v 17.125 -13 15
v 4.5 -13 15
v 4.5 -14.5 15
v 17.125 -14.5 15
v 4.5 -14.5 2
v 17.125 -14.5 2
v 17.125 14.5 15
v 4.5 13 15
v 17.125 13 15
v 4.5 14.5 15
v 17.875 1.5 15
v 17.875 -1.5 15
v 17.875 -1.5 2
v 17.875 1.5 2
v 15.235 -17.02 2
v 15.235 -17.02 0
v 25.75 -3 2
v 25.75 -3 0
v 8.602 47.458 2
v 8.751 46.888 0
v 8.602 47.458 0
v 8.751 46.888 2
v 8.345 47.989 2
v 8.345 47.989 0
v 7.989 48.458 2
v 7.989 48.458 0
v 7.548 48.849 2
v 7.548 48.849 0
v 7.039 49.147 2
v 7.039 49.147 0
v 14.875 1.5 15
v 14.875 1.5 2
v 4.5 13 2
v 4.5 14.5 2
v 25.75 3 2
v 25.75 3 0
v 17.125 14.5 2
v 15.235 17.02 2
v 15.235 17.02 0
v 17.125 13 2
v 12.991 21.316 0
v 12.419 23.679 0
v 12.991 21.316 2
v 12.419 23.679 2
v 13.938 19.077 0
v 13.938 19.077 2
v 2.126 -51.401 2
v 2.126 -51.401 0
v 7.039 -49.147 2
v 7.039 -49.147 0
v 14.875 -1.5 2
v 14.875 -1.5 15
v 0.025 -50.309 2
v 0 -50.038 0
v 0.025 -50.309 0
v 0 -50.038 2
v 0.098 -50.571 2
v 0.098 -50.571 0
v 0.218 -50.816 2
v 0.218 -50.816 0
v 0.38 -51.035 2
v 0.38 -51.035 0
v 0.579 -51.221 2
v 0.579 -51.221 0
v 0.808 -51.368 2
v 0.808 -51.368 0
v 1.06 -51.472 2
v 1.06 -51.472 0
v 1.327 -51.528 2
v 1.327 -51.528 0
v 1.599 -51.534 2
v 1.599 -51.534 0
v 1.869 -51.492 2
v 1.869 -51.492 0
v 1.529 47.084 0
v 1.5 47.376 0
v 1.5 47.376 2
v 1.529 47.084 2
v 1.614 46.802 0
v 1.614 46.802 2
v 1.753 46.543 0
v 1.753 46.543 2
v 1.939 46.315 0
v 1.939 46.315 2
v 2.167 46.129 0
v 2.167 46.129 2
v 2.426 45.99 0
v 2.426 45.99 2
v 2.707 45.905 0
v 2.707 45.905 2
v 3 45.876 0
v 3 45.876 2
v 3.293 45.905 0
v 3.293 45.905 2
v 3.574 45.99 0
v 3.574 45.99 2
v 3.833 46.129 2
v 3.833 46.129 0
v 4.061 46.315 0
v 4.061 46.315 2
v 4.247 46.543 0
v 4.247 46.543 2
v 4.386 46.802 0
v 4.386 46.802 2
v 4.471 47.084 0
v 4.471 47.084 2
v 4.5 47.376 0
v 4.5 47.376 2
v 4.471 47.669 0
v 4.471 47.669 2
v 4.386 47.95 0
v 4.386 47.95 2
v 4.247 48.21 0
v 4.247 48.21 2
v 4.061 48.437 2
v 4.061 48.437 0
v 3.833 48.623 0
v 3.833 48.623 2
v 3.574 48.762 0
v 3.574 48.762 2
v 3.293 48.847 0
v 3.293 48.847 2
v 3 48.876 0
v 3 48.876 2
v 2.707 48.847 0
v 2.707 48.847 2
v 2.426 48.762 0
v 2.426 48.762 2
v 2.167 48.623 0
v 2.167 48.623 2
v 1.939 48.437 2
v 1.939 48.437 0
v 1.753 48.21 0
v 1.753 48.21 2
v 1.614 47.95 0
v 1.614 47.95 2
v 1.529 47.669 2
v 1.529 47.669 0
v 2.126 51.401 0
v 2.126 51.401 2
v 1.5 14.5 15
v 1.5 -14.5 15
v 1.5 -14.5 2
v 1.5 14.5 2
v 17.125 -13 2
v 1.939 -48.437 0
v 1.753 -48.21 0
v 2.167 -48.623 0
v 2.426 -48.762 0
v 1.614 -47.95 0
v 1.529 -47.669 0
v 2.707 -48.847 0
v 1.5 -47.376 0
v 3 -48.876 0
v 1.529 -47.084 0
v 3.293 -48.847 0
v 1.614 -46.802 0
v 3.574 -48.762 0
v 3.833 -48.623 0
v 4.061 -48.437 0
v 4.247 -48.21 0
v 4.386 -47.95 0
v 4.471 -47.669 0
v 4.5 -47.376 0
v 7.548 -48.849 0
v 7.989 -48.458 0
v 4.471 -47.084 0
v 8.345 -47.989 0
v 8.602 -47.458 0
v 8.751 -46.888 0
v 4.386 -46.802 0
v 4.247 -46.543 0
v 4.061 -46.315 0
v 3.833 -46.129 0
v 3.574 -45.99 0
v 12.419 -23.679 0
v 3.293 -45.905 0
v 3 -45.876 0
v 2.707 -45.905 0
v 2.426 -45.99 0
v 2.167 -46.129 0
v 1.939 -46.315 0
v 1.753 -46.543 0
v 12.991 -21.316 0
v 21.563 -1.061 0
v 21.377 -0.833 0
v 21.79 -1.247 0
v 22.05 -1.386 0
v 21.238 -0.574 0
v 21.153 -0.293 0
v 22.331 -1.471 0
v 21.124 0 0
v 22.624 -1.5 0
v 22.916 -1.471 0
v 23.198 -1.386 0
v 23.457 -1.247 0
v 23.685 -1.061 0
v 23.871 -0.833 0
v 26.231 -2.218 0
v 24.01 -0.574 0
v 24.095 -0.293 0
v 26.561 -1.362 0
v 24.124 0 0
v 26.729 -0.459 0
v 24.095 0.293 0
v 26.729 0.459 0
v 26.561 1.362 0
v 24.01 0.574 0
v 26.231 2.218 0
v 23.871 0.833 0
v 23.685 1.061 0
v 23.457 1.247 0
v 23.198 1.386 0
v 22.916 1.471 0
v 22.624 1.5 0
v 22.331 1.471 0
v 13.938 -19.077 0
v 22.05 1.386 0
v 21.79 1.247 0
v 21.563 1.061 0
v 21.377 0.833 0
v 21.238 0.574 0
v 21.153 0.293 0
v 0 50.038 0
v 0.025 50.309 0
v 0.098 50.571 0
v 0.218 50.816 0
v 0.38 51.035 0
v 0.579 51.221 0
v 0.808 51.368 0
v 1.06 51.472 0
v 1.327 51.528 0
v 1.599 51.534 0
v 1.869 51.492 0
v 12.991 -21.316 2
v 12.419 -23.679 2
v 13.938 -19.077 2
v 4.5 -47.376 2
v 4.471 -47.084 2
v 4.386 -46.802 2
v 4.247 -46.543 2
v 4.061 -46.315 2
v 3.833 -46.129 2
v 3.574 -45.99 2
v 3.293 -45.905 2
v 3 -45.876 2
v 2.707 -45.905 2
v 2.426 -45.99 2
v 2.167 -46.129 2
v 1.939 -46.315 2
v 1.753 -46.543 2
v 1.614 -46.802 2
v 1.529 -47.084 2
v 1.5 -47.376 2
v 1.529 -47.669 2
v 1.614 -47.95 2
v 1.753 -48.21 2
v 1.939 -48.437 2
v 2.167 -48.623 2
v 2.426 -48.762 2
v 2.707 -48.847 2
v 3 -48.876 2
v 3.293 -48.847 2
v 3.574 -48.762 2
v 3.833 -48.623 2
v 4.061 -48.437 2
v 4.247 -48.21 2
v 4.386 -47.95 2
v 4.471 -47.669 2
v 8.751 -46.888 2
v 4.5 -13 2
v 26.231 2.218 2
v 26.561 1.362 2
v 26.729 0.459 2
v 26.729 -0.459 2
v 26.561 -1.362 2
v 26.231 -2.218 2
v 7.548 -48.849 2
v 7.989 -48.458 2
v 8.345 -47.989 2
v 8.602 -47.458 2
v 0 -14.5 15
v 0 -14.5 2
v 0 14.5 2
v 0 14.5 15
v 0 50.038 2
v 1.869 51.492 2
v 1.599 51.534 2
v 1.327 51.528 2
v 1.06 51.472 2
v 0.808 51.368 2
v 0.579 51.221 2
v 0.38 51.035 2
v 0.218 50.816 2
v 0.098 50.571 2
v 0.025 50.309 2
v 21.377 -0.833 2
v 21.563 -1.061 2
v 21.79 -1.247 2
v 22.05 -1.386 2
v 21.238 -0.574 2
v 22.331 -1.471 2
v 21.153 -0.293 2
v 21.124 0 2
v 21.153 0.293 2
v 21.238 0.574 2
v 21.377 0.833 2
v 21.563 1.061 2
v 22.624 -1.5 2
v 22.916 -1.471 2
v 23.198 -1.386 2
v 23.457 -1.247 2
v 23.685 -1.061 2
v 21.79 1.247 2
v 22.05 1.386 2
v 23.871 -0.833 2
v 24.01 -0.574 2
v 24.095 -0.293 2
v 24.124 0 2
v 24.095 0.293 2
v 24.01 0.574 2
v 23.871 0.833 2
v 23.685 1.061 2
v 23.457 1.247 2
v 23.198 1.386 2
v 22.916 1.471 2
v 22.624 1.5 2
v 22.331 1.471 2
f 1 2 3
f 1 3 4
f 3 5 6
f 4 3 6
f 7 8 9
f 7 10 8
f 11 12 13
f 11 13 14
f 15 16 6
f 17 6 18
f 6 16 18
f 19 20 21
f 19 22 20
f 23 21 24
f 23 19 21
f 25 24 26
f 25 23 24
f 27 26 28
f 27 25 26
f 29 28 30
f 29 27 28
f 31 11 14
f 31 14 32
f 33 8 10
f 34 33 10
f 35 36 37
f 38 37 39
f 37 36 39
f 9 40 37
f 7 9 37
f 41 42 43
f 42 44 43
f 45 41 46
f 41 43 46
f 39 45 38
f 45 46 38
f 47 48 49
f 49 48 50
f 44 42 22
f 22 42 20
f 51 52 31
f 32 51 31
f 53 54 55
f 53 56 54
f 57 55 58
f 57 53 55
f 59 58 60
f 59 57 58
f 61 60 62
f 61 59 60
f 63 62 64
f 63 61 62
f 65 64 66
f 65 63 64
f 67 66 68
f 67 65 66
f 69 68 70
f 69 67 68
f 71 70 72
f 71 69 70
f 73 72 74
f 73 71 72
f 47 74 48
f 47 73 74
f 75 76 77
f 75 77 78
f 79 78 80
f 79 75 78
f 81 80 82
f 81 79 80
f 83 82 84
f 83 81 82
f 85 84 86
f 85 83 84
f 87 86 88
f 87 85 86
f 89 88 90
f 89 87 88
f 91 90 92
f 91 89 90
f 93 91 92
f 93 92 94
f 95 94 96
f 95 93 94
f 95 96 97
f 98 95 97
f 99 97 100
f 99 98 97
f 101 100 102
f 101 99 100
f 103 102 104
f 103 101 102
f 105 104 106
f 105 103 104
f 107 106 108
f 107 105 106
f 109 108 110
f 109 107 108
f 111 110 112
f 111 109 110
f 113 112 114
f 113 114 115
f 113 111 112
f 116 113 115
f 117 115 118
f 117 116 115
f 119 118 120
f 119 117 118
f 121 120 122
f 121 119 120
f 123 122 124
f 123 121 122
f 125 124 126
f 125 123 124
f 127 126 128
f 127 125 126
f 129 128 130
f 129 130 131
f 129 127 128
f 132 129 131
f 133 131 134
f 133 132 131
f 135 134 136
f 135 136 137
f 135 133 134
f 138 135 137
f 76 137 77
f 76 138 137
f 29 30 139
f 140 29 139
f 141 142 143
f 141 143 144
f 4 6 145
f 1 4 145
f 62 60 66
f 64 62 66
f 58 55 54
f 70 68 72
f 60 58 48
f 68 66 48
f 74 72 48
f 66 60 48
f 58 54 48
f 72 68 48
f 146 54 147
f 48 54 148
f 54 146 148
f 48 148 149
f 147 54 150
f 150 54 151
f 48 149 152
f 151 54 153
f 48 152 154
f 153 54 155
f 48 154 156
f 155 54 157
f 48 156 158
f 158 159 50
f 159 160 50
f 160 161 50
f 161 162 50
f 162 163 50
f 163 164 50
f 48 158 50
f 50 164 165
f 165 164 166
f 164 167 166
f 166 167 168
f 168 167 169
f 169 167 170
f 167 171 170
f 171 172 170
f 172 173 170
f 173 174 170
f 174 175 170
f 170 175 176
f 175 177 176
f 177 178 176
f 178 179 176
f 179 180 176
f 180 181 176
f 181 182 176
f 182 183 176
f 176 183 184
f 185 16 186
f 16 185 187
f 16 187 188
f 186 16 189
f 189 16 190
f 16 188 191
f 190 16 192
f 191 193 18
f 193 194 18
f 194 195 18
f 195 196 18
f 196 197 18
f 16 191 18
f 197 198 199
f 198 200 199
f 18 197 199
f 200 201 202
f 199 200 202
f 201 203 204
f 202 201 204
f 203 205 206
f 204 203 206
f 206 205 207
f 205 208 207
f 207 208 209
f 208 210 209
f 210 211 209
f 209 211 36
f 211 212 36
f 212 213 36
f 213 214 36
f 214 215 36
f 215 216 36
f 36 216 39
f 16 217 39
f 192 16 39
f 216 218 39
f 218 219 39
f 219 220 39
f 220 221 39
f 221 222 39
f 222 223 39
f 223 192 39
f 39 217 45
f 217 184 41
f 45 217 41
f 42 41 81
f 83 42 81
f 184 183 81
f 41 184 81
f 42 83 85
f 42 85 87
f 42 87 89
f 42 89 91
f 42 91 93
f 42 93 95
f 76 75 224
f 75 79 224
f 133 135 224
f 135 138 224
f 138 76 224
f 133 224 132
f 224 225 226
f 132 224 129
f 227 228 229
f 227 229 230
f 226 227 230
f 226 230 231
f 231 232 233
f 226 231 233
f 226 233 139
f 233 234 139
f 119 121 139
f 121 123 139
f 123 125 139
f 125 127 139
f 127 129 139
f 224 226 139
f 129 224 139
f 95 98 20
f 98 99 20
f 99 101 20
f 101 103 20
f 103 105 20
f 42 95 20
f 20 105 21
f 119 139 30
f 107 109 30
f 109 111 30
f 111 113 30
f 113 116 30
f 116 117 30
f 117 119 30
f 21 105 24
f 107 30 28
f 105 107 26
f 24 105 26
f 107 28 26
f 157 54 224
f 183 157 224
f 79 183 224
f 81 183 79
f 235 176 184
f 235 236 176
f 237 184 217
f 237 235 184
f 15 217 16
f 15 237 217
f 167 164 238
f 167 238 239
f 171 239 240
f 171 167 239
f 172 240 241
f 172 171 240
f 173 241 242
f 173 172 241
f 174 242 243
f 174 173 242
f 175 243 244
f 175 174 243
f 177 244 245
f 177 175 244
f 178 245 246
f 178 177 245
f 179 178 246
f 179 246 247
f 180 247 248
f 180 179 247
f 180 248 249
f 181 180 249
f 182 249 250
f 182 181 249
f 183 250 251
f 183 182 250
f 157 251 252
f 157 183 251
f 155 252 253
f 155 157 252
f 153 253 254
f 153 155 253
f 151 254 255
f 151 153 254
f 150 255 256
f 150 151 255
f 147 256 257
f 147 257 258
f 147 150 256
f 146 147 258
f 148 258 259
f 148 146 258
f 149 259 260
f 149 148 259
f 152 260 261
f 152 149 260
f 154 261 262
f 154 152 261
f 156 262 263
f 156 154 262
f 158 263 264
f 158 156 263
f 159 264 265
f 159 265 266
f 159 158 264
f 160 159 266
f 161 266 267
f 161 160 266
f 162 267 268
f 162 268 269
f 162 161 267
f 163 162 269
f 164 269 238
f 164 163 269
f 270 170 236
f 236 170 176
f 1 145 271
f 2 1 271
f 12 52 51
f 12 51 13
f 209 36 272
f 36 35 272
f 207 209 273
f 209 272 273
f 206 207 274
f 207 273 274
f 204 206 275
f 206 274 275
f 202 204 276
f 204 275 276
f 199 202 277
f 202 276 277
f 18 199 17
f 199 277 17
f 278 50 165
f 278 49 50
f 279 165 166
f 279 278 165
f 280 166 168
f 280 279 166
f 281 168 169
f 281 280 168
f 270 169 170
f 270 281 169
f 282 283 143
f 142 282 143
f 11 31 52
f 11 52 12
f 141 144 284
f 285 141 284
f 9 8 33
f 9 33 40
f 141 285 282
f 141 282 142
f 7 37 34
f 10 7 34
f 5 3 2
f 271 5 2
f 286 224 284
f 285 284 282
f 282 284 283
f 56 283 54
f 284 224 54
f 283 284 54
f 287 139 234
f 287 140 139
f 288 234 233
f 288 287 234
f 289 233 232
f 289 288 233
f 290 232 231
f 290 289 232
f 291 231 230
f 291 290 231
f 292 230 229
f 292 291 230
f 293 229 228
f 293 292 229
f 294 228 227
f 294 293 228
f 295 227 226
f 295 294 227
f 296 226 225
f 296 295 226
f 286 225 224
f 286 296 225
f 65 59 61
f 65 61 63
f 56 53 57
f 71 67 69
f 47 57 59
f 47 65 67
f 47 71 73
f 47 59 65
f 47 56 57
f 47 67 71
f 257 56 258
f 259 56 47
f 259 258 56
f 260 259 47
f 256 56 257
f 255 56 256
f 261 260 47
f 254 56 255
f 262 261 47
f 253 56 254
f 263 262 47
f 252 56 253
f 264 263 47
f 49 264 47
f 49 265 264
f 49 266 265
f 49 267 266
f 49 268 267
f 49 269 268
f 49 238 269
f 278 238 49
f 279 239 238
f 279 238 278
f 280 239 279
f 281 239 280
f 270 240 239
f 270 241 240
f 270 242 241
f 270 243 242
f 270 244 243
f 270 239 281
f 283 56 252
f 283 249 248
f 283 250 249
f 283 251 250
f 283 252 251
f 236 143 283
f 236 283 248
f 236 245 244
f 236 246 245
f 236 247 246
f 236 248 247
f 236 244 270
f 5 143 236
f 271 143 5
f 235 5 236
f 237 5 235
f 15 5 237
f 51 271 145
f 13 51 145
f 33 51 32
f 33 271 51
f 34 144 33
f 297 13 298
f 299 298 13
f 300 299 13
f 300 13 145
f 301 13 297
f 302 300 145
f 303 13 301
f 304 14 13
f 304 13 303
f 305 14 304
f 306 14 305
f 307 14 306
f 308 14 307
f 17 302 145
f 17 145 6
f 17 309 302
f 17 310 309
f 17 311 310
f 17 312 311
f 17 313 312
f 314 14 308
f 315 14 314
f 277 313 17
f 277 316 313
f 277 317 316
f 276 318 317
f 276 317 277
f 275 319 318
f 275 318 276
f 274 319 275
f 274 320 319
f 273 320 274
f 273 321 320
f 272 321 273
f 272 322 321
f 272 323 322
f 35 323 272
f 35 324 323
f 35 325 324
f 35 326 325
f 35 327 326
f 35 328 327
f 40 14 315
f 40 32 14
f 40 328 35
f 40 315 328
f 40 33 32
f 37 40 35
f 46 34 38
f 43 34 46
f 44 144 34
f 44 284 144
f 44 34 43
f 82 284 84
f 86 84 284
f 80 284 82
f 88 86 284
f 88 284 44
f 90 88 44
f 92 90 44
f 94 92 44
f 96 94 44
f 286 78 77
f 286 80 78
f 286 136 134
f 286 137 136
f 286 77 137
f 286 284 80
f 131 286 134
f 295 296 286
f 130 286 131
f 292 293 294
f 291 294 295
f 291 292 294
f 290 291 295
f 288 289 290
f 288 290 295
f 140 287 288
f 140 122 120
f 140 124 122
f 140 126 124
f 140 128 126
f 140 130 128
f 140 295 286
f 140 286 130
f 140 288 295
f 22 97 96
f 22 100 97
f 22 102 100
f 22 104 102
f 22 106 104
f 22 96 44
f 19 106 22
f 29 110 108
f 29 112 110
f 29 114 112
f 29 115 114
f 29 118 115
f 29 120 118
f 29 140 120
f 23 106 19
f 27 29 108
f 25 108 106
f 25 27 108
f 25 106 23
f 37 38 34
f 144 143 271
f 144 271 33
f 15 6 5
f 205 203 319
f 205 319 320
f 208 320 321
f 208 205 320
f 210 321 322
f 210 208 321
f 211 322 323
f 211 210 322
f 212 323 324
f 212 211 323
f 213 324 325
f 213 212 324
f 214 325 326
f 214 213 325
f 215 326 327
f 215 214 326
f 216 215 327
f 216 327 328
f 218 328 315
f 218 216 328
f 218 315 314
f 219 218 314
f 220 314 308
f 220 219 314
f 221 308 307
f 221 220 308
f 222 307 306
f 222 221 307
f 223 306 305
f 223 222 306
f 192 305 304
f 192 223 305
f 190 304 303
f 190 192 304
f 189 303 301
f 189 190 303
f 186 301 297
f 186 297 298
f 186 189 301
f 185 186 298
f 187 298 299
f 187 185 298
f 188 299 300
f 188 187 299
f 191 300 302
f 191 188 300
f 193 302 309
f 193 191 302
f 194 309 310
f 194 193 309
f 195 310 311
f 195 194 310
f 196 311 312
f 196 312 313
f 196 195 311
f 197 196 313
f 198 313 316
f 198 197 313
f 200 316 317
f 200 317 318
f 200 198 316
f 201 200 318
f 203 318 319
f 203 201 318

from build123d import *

# Parameters (mm, degrees)
SKETCH1_R           = 1.5
BOSS_EXTRUDE1_DEPTH = 2
FILLET1_R           = 15
FILLET2_R           = 3
FILLET3_R           = 1.5
FILLET4_R           = 5
SKETCH2_W           = 1.5
SKETCH2_H           = 3
SKETCH2_W_2         = 0.75
BOSS_EXTRUDE2_DEPTH = 13
SKETCH4_W           = 3
SKETCH4_H           = 29
CUT_EXTRUDE1_DEPTH  = 13


with BuildPart() as part:
    # Sketch1 → Boss-Extrude1 (new body)
    with BuildSketch(Plane.XY):
        Polygon((0, 52.37615434), (0, -52.37615434), (8.5, -48.47615434), (13, -20), (28, 0), (13, 20), (8.5, 48.47615434), align=None)
        with Locations((3, -47.37615434)):
            Circle(SKETCH1_R, mode=Mode.SUBTRACT)
        with Locations((22.62384566, 0)):
            Circle(SKETCH1_R, mode=Mode.SUBTRACT)
        with Locations(Location((3, 47.37615434, 0), (0, 0, 180))):
            Circle(SKETCH1_R, mode=Mode.SUBTRACT)
    extrude(amount=BOSS_EXTRUDE1_DEPTH)

    # Fillet1
    fillet1_edges = [part.edges().sort_by_distance(p)[0] for p in [
        (13, 20, 1),
        (13, -20, 1),
    ]]
    fillet(fillet1_edges, radius=FILLET1_R)

    # Fillet2
    fillet2_edges = [part.edges().sort_by_distance(p)[0] for p in [
        (8.5, 48.47615434, 1),
        (8.5, -48.47615434, 1),
    ]]
    fillet(fillet2_edges, radius=FILLET2_R)

    # Fillet3
    fillet3_edges = [part.edges().sort_by_distance(p)[0] for p in [
        (0, -52.37615434, 1),
        (0, 52.37615434, 1),
    ]]
    fillet(fillet3_edges, radius=FILLET3_R)

    # Fillet4
    fillet4_edges = [part.edges().sort_by_distance(p)[0] for p in [
        (28, 0, 1),
    ]]
    fillet(fillet4_edges, radius=FILLET4_R)

    # Sketch2 → Boss-Extrude2 (add)
    with BuildSketch(Plane.XY.offset(2)):
        Polygon((17.125, 13), (17.125, 14.5), (0, 14.5), (0, -14.5), (17.125, -14.5), (17.125, -13), (15.625, -13), (1.5, -13), (1.5, 13), (15.625, 13), align=None)
        with Locations((16.375, 0)):
            Rectangle(SKETCH2_W, SKETCH2_H)
        with Locations((17.5, 0)):
            Rectangle(SKETCH2_W_2, SKETCH2_H)
        with Locations((15.25, 0)):
            Rectangle(SKETCH2_W_2, SKETCH2_H)
    extrude(amount=BOSS_EXTRUDE2_DEPTH)

    # Sketch4 → Cut-Extrude1 (cut)
    with BuildSketch(Plane.XY.offset(15)):
        with Locations((3, 0)):
            Rectangle(SKETCH4_W, SKETCH4_H)
    extrude(amount=-CUT_EXTRUDE1_DEPTH, mode=Mode.SUBTRACT)


solid = part.part
